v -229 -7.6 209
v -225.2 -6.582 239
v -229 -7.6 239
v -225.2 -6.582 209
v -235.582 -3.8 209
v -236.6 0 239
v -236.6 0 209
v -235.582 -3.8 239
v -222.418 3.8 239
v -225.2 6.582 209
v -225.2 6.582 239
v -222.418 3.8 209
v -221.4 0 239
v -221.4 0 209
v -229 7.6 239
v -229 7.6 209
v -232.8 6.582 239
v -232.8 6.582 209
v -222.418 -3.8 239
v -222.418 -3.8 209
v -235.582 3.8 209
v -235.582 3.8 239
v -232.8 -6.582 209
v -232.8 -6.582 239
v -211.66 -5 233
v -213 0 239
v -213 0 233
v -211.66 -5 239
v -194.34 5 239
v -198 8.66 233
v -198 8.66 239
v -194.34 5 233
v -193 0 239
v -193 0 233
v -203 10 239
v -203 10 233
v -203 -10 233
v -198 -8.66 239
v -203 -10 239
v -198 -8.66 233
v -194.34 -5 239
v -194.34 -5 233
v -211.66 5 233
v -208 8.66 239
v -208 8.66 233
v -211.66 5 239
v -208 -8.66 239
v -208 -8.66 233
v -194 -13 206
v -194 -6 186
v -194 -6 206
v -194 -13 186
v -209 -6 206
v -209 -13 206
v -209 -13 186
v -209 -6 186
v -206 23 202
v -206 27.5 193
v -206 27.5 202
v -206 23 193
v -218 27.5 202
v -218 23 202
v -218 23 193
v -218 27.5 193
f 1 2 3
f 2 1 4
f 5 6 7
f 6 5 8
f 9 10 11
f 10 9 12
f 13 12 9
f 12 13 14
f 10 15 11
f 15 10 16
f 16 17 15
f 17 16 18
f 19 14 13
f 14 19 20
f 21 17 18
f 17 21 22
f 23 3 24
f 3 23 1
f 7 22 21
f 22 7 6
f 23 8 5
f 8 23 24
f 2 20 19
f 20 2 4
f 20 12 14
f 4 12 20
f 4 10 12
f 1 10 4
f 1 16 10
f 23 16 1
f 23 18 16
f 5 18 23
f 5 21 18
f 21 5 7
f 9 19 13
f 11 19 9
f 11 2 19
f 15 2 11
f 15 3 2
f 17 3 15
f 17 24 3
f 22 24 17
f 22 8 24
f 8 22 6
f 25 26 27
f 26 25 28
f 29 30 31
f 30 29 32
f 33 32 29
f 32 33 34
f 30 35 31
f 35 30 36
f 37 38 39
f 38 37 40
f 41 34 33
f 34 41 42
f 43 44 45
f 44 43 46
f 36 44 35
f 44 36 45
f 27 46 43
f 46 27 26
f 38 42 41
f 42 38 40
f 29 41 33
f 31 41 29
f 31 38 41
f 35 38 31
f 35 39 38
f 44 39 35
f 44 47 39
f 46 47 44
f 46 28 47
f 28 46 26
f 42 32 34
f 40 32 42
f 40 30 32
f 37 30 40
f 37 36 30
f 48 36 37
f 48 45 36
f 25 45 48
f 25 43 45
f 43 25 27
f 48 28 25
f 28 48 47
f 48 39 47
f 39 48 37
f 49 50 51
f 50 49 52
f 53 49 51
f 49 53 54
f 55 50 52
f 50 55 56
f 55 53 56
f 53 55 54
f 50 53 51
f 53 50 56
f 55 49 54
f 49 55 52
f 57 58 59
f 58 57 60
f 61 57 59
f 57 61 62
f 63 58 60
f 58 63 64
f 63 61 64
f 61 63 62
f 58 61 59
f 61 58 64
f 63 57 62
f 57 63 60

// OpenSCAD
// file: ../Parts/rounder.scad
// rounder.scad
// cutting tool for rounding off corners with a cylinder

//---------------------
module rounder(
r=10,   // radius
h=10,   // height
f=22,    // $fn
extra=0.01  // extra size for the cube
){

difference(){
  translate([-extra,-extra,-extra])
  cube([r+extra,r+extra,h+2*extra]);
  translate([r,r,-1])
  cylinder(r=r,h=h+2,$fn=f);
}

}

//========================

rounder();

//========================
// file: ../Parts/acin.scad
// acin.scad
// Delta AC input, with switch, fuse, and EMI line filter
// 115V/6A, 250V/4A, PN 06AR2D

use <tslot.scad>
use <rounder.scad>

//---------------------------------------------------------
module acin(tol=0,cut=0){
translate([-tol/2,-tol/2,-tol/2])


difference(){
  union(){
    // body
    cube([44+tol,26.8+tol,65+tol]);
    // front plate
    translate([ 44, -(29-26.8)/2, -(67.35-65)/2 ])
    cube([3+tol,29+tol,67.35+tol]);
  }
  if(cut==0){
    translate([ 47-18, 6, 5 ])
    cube([18.7,16.5,24.5]);
  }
}
  
// switch
translate([ 42, 3, 48 ])
rotate([0,0,30])
cube([13,15,11]);

// ground tab
translate([ -12, 10, 63 ])
cube([12,6.3,1]);

// line tab
translate([ -12, 5.5, 49 ])
cube([12,1,6.3]);

// neutral tab
translate([ -12, 26-5.5, 49 ])
cube([12,1,6.3]);

}

//--------------------------------------
module acbox(){
  
  difference(){
    translate([-58,15.1,34])
    cube([53,33,50]);

    translate([-60,14,57])
    rotate([0,-23,0])
    cube([65,40,30]);

    translate([-60,14,78])
    cube([65,40,30]);

    translate([-55,18,36])
    acin(tol=0.15,cut=1);

    translate([-9,20,38])   // for support
    cube([5,24,34]);
    
    translate([-22,32,30])
    cylinder(r=9,h=10,$fn=22);

    translate([-44,32,30])
    cylinder(r=9,h=10,$fn=22);

    translate([-24,50,52])
    rotate([90,0,0])
    cylinder(r=10,h=10,$fn=22);

    translate([-45,50,49])
    rotate([90,0,0])
    cylinder(r=7,h=10,$fn=22);

    translate([-60,32,46])
    rotate([0,90,0])
    cylinder(r=6,h=10,$fn=22);

  }


    difference(){
      color("pink")
      translate([-58,11.0,50.2-2])
      cube([53,5,6]);

      color("gray")
      translate([-59,11.0,52-2.5])
      rotate([45,0,0])
      cube([55,7,6]);
    }
    
    color("cyan")
    difference(){
      hull(){
        translate([-58,11,44.5])
        cube([53,5,5]);
        translate([-33,0,44.5])
        scale([1.5,1,1])
        cylinder(r=13,h=5,$fn=88);
      }

      // back rail
      color("gray")
      translate([-200,0,15])
      rotate([90,0,90])
      tslot1(type=2,len=200,tol=0.15);
      
      // tslot mounts
      translate([-33,0,40])
      cylinder(r=5.9/2,h=20,$fn=22);

    }
}

//===============================
//acbox();

// support for the bar above the plug
if(1){
color("pink")
translate([-8,20,38])   // for support
cube([3,24,34]);

      hull(){
        translate([-58,11,34])
        cube([53,5,12]);
        translate([-33,0,34])
        scale([1.5,1,1])
        cylinder(r=13,h=12,$fn=88);
      }
}

if(0){
color("orange")
translate([-55,18,36])
acin();
}

if(0){
    // back rail
    color("gray")
    translate([-200,0,15])
    rotate([90,0,90])
    tslot1(type=2,len=200);

    // left rail
    color("green")
    translate([-30,15,0])
    rotate([0,90,90])
    tslot1(type=2,len=150);

    // left tower corner 1
    color("gray")
    translate([-15,60+25+15,15])
    rotate([90,0,-90])
    tbrace();
    
    // left tower corner 2
    color("gray")
    translate([-45,60+25+15,15])
    rotate([90,0,-90])
    tbrace();
}

//===============================
// file: zaxis.scad
// zaxis

use <../Parts/tslot.scad>
use <../Parts/motors.scad>
use <../Parts/switch.scad>
use <../Parts/rounder.scad>

// Center to motor screw
x1=-7; 

// Center to rod
x3=19;

// Label?
yoff3=6;

// sides2
F2=88;


//------------------------------
module zleft1(
x1=-10,
x3=15,
yoff3=6
){

F2=88;
F3=88;

z4=41;  // translate 38
z5=6;  // thick 10

difference(){
// boss
minkowski(){    
union(){
    // over motor
    color("gray")
    translate([-6,-2,z4])
    linear_extrude(height=z5,convexity=10)
    square([44,48],center=true);

    // back corner
    color("pink")
    translate([20,-13,z4])
    linear_extrude(height=z5,convexity=10)
    square([16,24],center=true);

    // rounded corner
    color("green")
    translate([16,-2,z4])
    scale([1,2,1])
    cylinder(r=12,h=z5,$fn=F2);

    // collar around rod
    color("red")
    translate([x3,0,z4+z5])
    cylinder(r=7,h=2,$fn=F2);

    difference(){
        // vertical tab
        color("orange")
        translate([0,-22,z4])
        linear_extrude(height=21,convexity=10)
        square([56,8],center=true);

        // corner cutout for extruder body
        translate([x1-19,-10,62])
        rotate([90,0,0])
        cylinder(r=8,h=30,$fn=F2);
    }

    // fillet
    color("blue")
    translate([0,-16.0,z4+3])
    rotate([45,0,0])
    linear_extrude(height=6,convexity=10)
    square([56,6],center=true);

    // collar around screw
    translate([x1,0,z4+z5])
    cylinder(r=7,h=2,$fn=F2);
}
sphere(r=2,$fs=0.2);
}


// left tower
translate([0,-30-42.3/2-yoff3,0])
tslot1(type=3,len=100,tol=0.15);

// left z motor
color("red")
translate([x1,0,0])
rotate([0,0,180])
zmotor(tol=0.15);

// left z rod, add some tolerance
color("red")
translate([x3,0,42])
cylinder(r=5+0.05,h=350,$fn=F2);
    
    // mounting holes,
    translate([15.5+x1,15.5,30])
    cylinder(r=1.6,h=30,$fn=F3);
    translate([-15.5+x1,15.5,30])
    cylinder(r=1.6,h=30,$fn=F3);
    translate([15.5+x1,-15.5,30])
    cylinder(r=1.6,h=20,$fn=F3);
    translate([-15.5+x1,-15.5,30])
    cylinder(r=1.6,h=20,$fn=F3);

    // countersink for the heads
    translate([15.5+x1,15.5,46])
    cylinder(r=2.8,h=4,$fn=F3);
    translate([-15.5+x1,15.5,46])
    cylinder(r=2.8,h=4,$fn=F3);
    translate([15.5+x1,-15.5,46])
    cylinder(r=2.8,h=30,$fn=F3);
    translate([-15.5+x1,-15.5,46])
    cylinder(r=2.8,h=30,$fn=F3);


    // extra clearance for leadscrew
    translate([x1,0,z4-5])
    cylinder(r=5,h=20,$fn=F2);

    // tslot mounts
    translate([15,-42.3/2-5-yoff3,56])
    rotate([-90,0,0])
    cylinder(r=5.9/2,h=20,$fn=F2);

    translate([15,-42.3/2+0.5-yoff3+5,56])
    rotate([-90,0,0])
    cylinder(r=5,h=6,$fn=F2);

    translate([-15,-42.3/2-5-yoff3,56])
    rotate([-90,0,0])
    cylinder(r=5.9/2,h=20,$fn=F2);

    translate([-15,-42.3/2+0.5-yoff3+5,56])
    rotate([-90,0,0])
    cylinder(r=5,h=6,$fn=F2);
}    
}

//----------------------------------------------------------------
module zleft2a(
x1=-8,
x3=17,
yoff3=6,
endstop=1
){

F2=88;
F3=22;

// boss
difference(){
translate([0,0,342])
union(){
    // over rods
    color("cyan")
    translate([6,-9.5,53])
    cube([44,37,20],center=true);

    // end stop switch block
    color("orange")
    translate([6,-9.5,34])
    cube([26,37,24],center=true);
    translate([23,-14,34])
    cube([10,28,24],center=true);

    // collar around rod
    color("red")
    translate([x3,0,22])
    cylinder(r=9,h=24,$fn=F2);

    // collar around screw
    translate([x1,0,22])
    cylinder(r=9,h=24,$fn=F2);


}
    // corner cuts
    color("pink")
    translate([28,9,38+342])
    rotate([0,0,180])
    rounder(r=9,h=30,f=88);

    // corner cuts
    color("pink")
    translate([-16,9,38+342])
    rotate([0,0,-90])
    rounder(r=9,h=30,f=88);
    
    // left tower, note extra clearance tol=0.25
    translate([0,-30-42.3/2-yoff3,0])
    tslot1(type=3,len=380,tol=0.25);

    // top rail, no extra clearance tol=0.15
    translate([-30,-30-42.3/2-yoff3,380+15])
    rotate([0,90,0])
    tslot1(type=2,len=60,tol=0.15);

    // left top L front
    color("pink")
    translate([0,-42.3/2-yoff3,380+30])
    rotate([-90,90,0])
    lbrace(tol=0.15);
    // trim off leftover that is in the Tslot
    color("red")
    translate([-25,-42.3/2-yoff3-4,386])
    cube([25,6,20]);

    // left z rod, add some tolerance
    color("red")
    translate([x3,0,42])
    cylinder(r=5+0.1,h=350.15,$fn=F2);
    
    // extra clearance for leadscrew
    translate([x1,0,360])
    cylinder(r=5,h=30,$fn=F3);

    // M5 mount to top rail
    translate([5,-42.3/2-yoff3-4,380+15])
    rotate([-90,0,0])
    cylinder(r=5.9/2,h=12,$fn=F2);

    translate([5,-42.3/2+0.5-yoff3+6.5,380+15])
    rotate([-90,0,0])
    cylinder(r=5,h=60,$fn=F2);
  
if(endstop==1){  
    // cut for the end stop switch
    Tol1=0.15;
    translate([9,-42.3/2-yoff3+1,381])
    rotate([-90,0,90])
    translate([-Tol1/2,-Tol1/2,-Tol1/2])
    switch(ang1=0,tol=Tol1);
  
    // cuts for the end stop switch
    // allow insertion
    translate([-8,-42.3/2-yoff3-3.5,352])
    cube([10.5,25,30]);
    translate([-8,-42.3/2-yoff3+19,350])
    cube([10,6,20]);
    
    // cut for lever arm near fulcrum
    translate([2,-42.3/2-yoff3+3,352])
    cube([7,17,20]);
    // cut for lever arm near roller
    translate([-0.5,-42.3/2-yoff3+10,352])
    cube([11,15,18]);
    // cut for NC
    translate([-6,-42.3/2-yoff3+17,380])
    cube([16,3.5,7]);
    // cut for NO
    translate([-6,-42.3/2-yoff3+10,380])
    cube([16,3.5,7]);
    // cut for C
    translate([-6,-42.3/2-yoff3+1,380])
    cube([16,3.5,7]);
    // trim down the posts
    translate([2.4,-42.3/2-yoff3+4,374])
    cube([4,14,6]);

}  // end of if(endstop)

  // add a tunnel for the endstop wires
  translate([-12,yoff3-23,380])
  cylinder(r=1.8,h=33,$fn=22);
  translate([-12,yoff3-23,404])
  cylinder(r1=1.8,r2=2.8,h=1,$fn=22);
  translate([-12,yoff3-23,385])
  cylinder(r1=2.8,r2=1.8,h=1,$fn=22);
  
} // end of difference

// add a loop for the wires **************
difference(){
  hull(){
  translate([-9,yoff3-23,380])
  rotate([0,90,0])
  cylinder(r=3,h=3,$fn=22);
  translate([-9,yoff3-23,390])
  rotate([0,90,0])
  cylinder(r=3,h=3,$fn=22);
  }
  translate([-10,yoff3-23,380])
  rotate([0,90,0])
  cylinder(r=1.8,h=5,$fn=22);
}

// show where switch will fit, both angles for the lever arm
if(0){
  translate([9,-42.3/2-yoff3+1,381])
  rotate([-90,0,90]){
    color("green")
    switch(ang1=10);
    color("red")
    switch(ang1=0);
    }
}    
    
}

//---------------------------------
module zleft2(
x1=-8,
x3=17,
yoff3=6
){

F2=88;
F3=22;
    
    zleft2a(x1=x1,x3=x3,yoff3=yoff3);

    
}
//---------------------------------
module zright2(
x1=-8,
x3=17,
yoff3=6
){

F2=88;
F3=22;
    
    mirror([1,0,0])
    zleft2a(x1=x1,x3=x3,yoff3=yoff3);
    
}


//===============================


//mirror([1,0,0])
//zleft1(x1=x1,x3=x3,yoff3=yoff3);

//translate([70,0,0])
//zleft2(x1=x1,x3=x3,yoff3=yoff3);

zright2(x1=x1,x3=x3,yoff3=yoff3);

if(0){
// left tower
color("gray")
translate([0,-30-42.3/2-yoff3,0])
tslot1(type=3,len=380,tol=0.15);

// top rail
color("gray")
translate([-30,-30-42.3/2-yoff3,380+15])
rotate([0,90,0])
tslot1(type=2,len=60,tol=0.15);

// left top L front
color("pink")
translate([0,-42.3/2-yoff3,380+30])
rotate([-90,90,0])
lbrace();

/*
// left z motor
color("red")
translate([x1,0,0])
rotate([0,0,180])
zmotor(tol=0.15);
*/

// left z rod, add some tolerance
color("red")
translate([x3,0,42])
cylinder(r=5+0.1,h=350,$fn=F2);
}

//================================
// file: frame.scad
// frame
// frame for the PrusaDusa

use <../Parts/tslot.scad>
use <../Parts/acin.scad>



//-----------------------------------------------------------------
// Customizer Values:
// These must be at the top of the main file, cannot contain any
// computations, and should have a comment above to provide text

// Tower offset from center 
yoff=-50; 

// Length front, back, top rail 
x1=480;         

// Length side rails
y1=330;      

// Length of towers
z1=380;       

//--------------------------------------
module frame(
yoff=-62,       // tower and top offset from center
x1=480,         // length front, back, top rails
y1=330,         // length side rails
z1=380          // height of towers
){
    
x2=x1/2;    // 240
y2=y1/2;    // 165
    //---------- rails ----------------
    
    // front rail
    translate([-x2,y2+15,15])
    rotate([90,0,90])
    tslot1(type=2,len=x1);

    // back rail
    translate([-x2,-y2-15,15])
    rotate([90,0,90])
    tslot1(type=2,len=x1);

    // left rail
    translate([x2-30,-y2,0])
    rotate([0,90,90])
    tslot1(type=2,len=y1);

    // right rail
    translate([-x2+30,-y2,0])
    rotate([0,90,90])
    tslot1(type=2,len=y1);

    // left tower
    translate([x2-30,yoff,15])
    rotate([0,0,0])
    tslot1(type=3,len=z1);

    // right tower
    translate([-x2+30,yoff,15])
    rotate([0,0,0])
    tslot1(type=3,len=z1);

    // top rail
    translate([-x2,yoff,15+z1+15])
    rotate([0,90,0])
    tslot1(type=2,len=x1);
    
    //--------- triangle corners in base ------------
    
    // right front corner
    color("green")
    translate([-x2+60,y2,0])
    rotate([0,0,-90])
    tbrace();
    
    // left front corner
    color("red")
    translate([x2-60,y2,0])
    rotate([0,0,-180])
    tbrace();
    
    // right rear corner
    color("gray")
    translate([-x2+60,-y2,0])
    rotate([0,0,0])
    tbrace();
    
    // left rear corner
    color("gray")
    translate([x2-60,-y2,0])
    rotate([0,0,-270])
    tbrace();

    //--------- triangle corners top beam ----------  

    // Removed two triangle corners for extruder clearance
    
/*
    // left top corner 1
    color("gray")
    translate([x2-60,yoff+15,z1+15])
    rotate([90,180,0])
    tbrace();
    
    // left top corner 2
    color("gray")
    translate([x2-60,yoff-15,z1+15])
    rotate([90,180,0])
    tbrace();

    
    // right top corner 1
    color("gray")
    translate([-x2+60,yoff+15,z1+15])
    rotate([90,90,0])
    tbrace();
    
    // right top corner 2
    color("gray")
    translate([-x2+60,yoff-15,z1+15])
    rotate([90,90,0])
    tbrace();
*/
    
   //------------- triangle corners back of towers -------------
   
    // left tower corner 1
    color("gray")
    translate([x2-45,yoff-30,15])
    rotate([90,0,-90])
    tbrace();
    
    // left tower corner 2
    color("gray")
    translate([x2-15,yoff-30,15])
    rotate([90,0,-90])
    tbrace();
    
    // right tower corner 1
    color("gray")
    translate([-x2+45,yoff-30,15])
    rotate([90,0,-90])
    tbrace();

    // right tower corner 2
    color("gray")
    translate([-x2+15,yoff-30,15])
    rotate([90,0,-90])
    tbrace();
    
    // ----------- L braces in the base ----------------
/*
    // left front L top
    color("gray")
    translate([x2,y2+30,15])
    rotate([0,0,-180])
    lbrace();
    
    // right front L top
    color("gray")
    translate([-x2,y2+30,15])
    rotate([0,0,-90])
    lbrace();

    // left rear L top
    color("gray")
    translate([x2,-y2-30,15])
    rotate([0,0,90])
    lbrace();
    
    // right rear L top
    color("gray")
    translate([-x2,-y2-30,15])
    rotate([0,0,0])
    lbrace();
    
*/    
    // left front L bottom
    color("gray")
    translate([-x2,y2+30,-15])
    rotate([180,0,0])
    lbrace();
    
    // left front L bottom
    color("gray")
    translate([x2,y2+30,-15])
    rotate([180,0,-90])
    lbrace();
    
    // left rear L bottom
    color("gray")
    translate([-x2,-y2-30,-15])
    rotate([180,0,90])
    lbrace();
    
    // left rear L bottom
    color("gray")
    translate([x2,-y2-30,-15])
    rotate([180,0,-180])
    lbrace();
    
    // ------------ L braces top rail --------------
    // left top L front
    color("gray")
    translate([x2-30,yoff+30,z1+45])
    rotate([-90,90,0])
    lbrace();
    
    // left top L rear
    color("gray")
    translate([x2-30,yoff-30,z1+45])
    rotate([90,180,0])
    lbrace();
    
    // right top L front
    color("gray")
    translate([-x2+30,yoff+30,z1+45])
    rotate([-90,0,0])
    lbrace();
    
    
    // right top L rear
    color("gray")
    translate([-x2+30,yoff-30,z1+45])
    rotate([90,90,0])
    lbrace();
    
    //------------ shelf -----------------
    
    // left side rail
    translate([x2-15,yoff-30,15+z1+15])
    rotate([0,90,-90])
    tslot1(type=1,len=120);
    
    // left side rail
    translate([-x2+15,yoff-30,15+z1+15])
    rotate([0,90,-90])
    tslot1(type=1,len=120);
    
    // back rail
    translate([-x2,yoff-165,15+z1+15])
    rotate([0,90,0])
    tslot1(type=1,len=x1);

    //---------- triangle corners shelf ---------------

    // left shelf corner
    color("red")
    translate([x2-15,yoff-30,z1+15])
    rotate([-90,0,-90])
    tbrace();

    // right shelf corner
    color("green")
    translate([-x2+15,yoff-30,z1+15])
    rotate([-90,0,-90])
    tbrace();
    
    //---------- L braces shelf ------------------

    // tower to shelf left
    color("gray")
    translate([x2,yoff,z1+45])
    rotate([-90,0,-90])
    lbrace();
    
    // tower to shelf right
    color("gray")
    translate([-x2,yoff,z1+45])
    rotate([90,90,-90])
    lbrace();
    
    // left side rail to back rail
    color("gray")
    translate([x2,yoff-180,z1+15])
    rotate([0,180,0])
    lbrace();
    
    // right side rail to back rail
    color("gray")
    translate([-x2,yoff-180,z1+15])
    rotate([0,180,-90])
    lbrace();
    
    // power supply
    color("silver")
    translate([x2-45,yoff-30,90])
    rotate([0,0,180])
    ps();
    
    // ac box
    translate([x2,-y2-15,0]){
    color("green")
    acbox();
    color("gray")
    translate([-55,20,36])
    acin();
    }
}
//------------------------------------
module ps(){
  
translate([-45,0,0]){
  // body
  cube([90,45,225]);
  // tabs
  translate([15/2,0,225])
  cube([75,1,14]);
  translate([15/2,0,-14])
  cube([75,1,14]);
}
// power cords
translate([-25,45/2,225])
cylinder(r=4.5,h=12,$fn=22);
translate([0,45/2,-12])
cylinder(r=4.5,h=12,$fn=22);
  
} 

 
//====================================

frame(yoff=yoff,x1=x1,y1=y1,z1=z1);
//cylinder(r=10,h=180);

//ps();
 
//=====================================
// file: ../Parts/switch.scad
// switch.scad
// micro switch 



//--------------
module switch(
tol=0,  // include for cutting
ang1=5,  // angle of the lever arm
wirecut=0   // set to 1 for clearance around terminals
){

difference(){
  // switch body
  cube([20+tol,9.9+tol,6.5+tol]);  

  // mounting hole NO
  translate([5.0,2.8,-1])
  cylinder(r=2.3/2-tol,h=10,$fn=22);

  // mounting hole NC
  translate([14.75,2.8,-1])
  cylinder(r=2.3/2-tol,h=10,$fn=22);
}

// lump on top body
translate([0,9.9,0])
cube([9.9+tol,0.7+tol,6.5+tol]);  
  
// common leg
translate([1.5,-4.1,1.5])
cube([0.5+tol,4.1+tol,3.2+tol]);

// normally open leg
translate([10.3,-4.1,1.5])
cube([0.5+tol,4.1+tol,3.2+tol]);

// normally closed leg
translate([17.7,-4.1,1.5])
cube([0.5+tol,4.1+tol,3.2+tol]);

// lever fulcrum
translate([2.8,10.4,1.25])
cube([1.5+tol,1.5+tol,4.0+tol]);

// -------- these parts move:

// lever arm
translate([2.8,11.6,1.25])
rotate([0,0,ang1]){
  
  // arm
  cube([19.2+tol,0.35+tol,4.0+tol]);
  
  // roller
  translate([17.5,3.0,0])
  cylinder(r=4.5/2+tol,h=4+tol,$fn=22);
  
  // roller support
  translate([17.5,3.0,-1.5])
  cylinder(r=3.7/2+tol,h=6.9+tol,$fn=22);
  color("cyan")
  translate([17.5-1.75,0,-1.5])
  cube([3.7+tol,3+tol,1.5+tol]);
  color("cyan")
  translate([17.5-1.75,0,-1.5+5.4])
  cube([3.7+tol,3+tol,1.5+tol]);
  
}

}  // end of module switch
//------------------------------------------
module switchcut(tol=0.15){
  
difference(){
  // switch body
  translate([-tol/2,-tol/2,-tol/2])
  cube([20+tol,9.9+tol,13+tol]);  

  // mounting hole NO
  translate([5.0,2.8,-1])
  cylinder(r=2.3/2-tol/2,h=4,$fn=22);

  // mounting hole NC
  translate([14.75,2.8,-1])
  cylinder(r=2.3/2-tol/2,h=4,$fn=22);
}

translate([-tol/2,-tol/2,-tol/2]){

// lump on top body
translate([0,9.9,0])
cube([9.9+tol,0.7+tol,13+tol]);  
  
// common leg
translate([0.5,-4.3,1])
cube([3,4.5,12]);

// normally open leg
translate([9.3,-4.3,1])
cube([3,4.5,12]);

// normally closed leg
translate([16.7,-4.3,1])
cube([3,4.5,12]);

// arm
translate([1.5,8,0])
cube([16.5,13,13]);

// roller
translate([16,11,-1])
cube([7.5,10,15]);

// insertion cut
translate([0,0,6.4])
cube([20+tol,16,6.5]);  
}

}
  
//==========================================

//translate([0,0,6.5])
color("red") 
switch(ang1=0);
color("green") 
switch(ang1=12);

difference(){
  translate([-5,-5,-5])  
  cube([30,20,16]);
  switchcut(tol=0.15);
}

if(0){
Tol1=0.2;
translate([0,25,0])
difference(){
  translate([-Tol1/2,-Tol1/2,-Tol1/2])  
  switch(ang1=0,tol=Tol1);
  switch(ang1=0);
}
}

//==================
// file: ../Parts/motors.scad
// motors

//-------------------------------------
module zmotor(tol=0){
F2=88;
F3=22;
    
    difference(){
    // boss
    translate([0,0,39/2])
    intersection(){
        cube([42.4+tol,42.4+tol,39+tol],center=true);
        cylinder(r=25+tol,h=40,center=true,$fn=F2);
    }
    // mounting holes
    translate([15.5,15.5,35])
    cylinder(r=1.5,h=10,$fn=F3);
    translate([-15.5,15.5,35])
    cylinder(r=1.5,h=10,$fn=F3);
    translate([15.5,-15.5,35])
    cylinder(r=1.5,h=10,$fn=F3);
    translate([-15.5,-15.5,35])
    cylinder(r=1.5,h=10,$fn=F3);
    
    }
    
    // top cylinder
    translate([0,0,39])
    cylinder(r=11+tol,h=1.85+tol,$fn=F2);
    
    // wiring box
    translate([42.4/2,-16.5/2,0])
    cube([6.3+tol,16.5+tol,10+tol]);
    
    // lead screw
    translate([0,0,39])
    cylinder(r=4+tol,h=350+tol,$fn=F3);
    
}
//-------------------------------------
module xymotor(tol=0){
F2=88;
F3=22;
    z1=47.3;
    
    difference(){
    // boss
    translate([0,0,z1/2])
    intersection(){
        cube([42.4,42.4,z1],center=true);
        cylinder(r=53/2,h=z1,center=true,$fn=F2);
    }

    // stator stack smaller than end plates
    translate([0,0,z1/2]){
        difference(){
            cube([60,60,30.2],center=true);
            cylinder(r=50.2/2,h=30.2,center=true,$fn=F2);
        }
    }
    
    // mounting holes
    translate([15.5,15.5,z1-5])
    cylinder(r=1.5,h=10,$fn=F3);
    translate([-15.5,15.5,z1-5])
    cylinder(r=1.5,h=10,$fn=F3);
    translate([15.5,-15.5,z1-5])
    cylinder(r=1.5,h=10,$fn=F3);
    translate([-15.5,-15.5,z1-5])
    cylinder(r=1.5,h=10,$fn=F3);
    
    }
    
    // top cylinder
    translate([0,0,z1])
    cylinder(r=11,h=1.85,$fn=F2);
    
    // wiring box
    translate([42.4/2,0,2.0+2.5])
    rotate([0,90,0])
    cylinder(r=2.5,h=10);
    
    // main shaft
    translate([0,0,z1])
    cylinder(r=2.5,h=20,$fn=F3);
    
}
//-------------------------------------
module emotor(tol=0){
F2=88;
F3=22;
    z1=39.0;
    
    difference(){
    // boss
    translate([0,0,z1/2])
    intersection(){
        cube([42.4,42.4,z1],center=true);
        cylinder(r=53/2,h=z1,center=true,$fn=F2);
    }

    // stator stack smaller than end plates
    translate([0,0,z1/2]){
        difference(){
            cube([60,60,14.2],center=true);
            cylinder(r=50/2,h=30.2,center=true,$fn=F2);
        }
    }
    
    // mounting holes
    translate([15.5,15.5,z1-5])
    cylinder(r=1.5,h=10,$fn=F3);
    translate([-15.5,15.5,z1-5])
    cylinder(r=1.5,h=10,$fn=F3);
    translate([15.5,-15.5,z1-5])
    cylinder(r=1.5,h=10,$fn=F3);
    translate([-15.5,-15.5,z1-5])
    cylinder(r=1.5,h=10,$fn=F3);
    
    }
    
    // top cylinder
    translate([0,0,z1])
    cylinder(r=11,h=1.85,$fn=F2);
    
    // wiring box
    translate([42.4/2,-8.25,0])
    cube([8+tol,16.5+tol,11+tol]);
    
    // main shaft
    translate([0,0,z1])
    cylinder(r=2.5,h=28,$fn=F3);
    
}
//-----------------------------------
module znut(holes=1,tol=0){
    F2=88;
    
    cylinder(r=9.95/2+tol,h=10.45+tol,$fn=F2);
    
    difference(){
        translate([0,0,2])
        cylinder(r=21.9/2+tol,h=3.55,$fn=F2);

        if(holes==1){
            translate([7.75,0,0])
            cylinder(r=1.5,h=6,$fn=F2);
            translate([0,7.75,0])
            cylinder(r=1.5,h=6,$fn=F2);
            translate([-7.75,0,0])
            cylinder(r=1.5,h=6,$fn=F2);
            translate([0,-7.75,0])
            cylinder(r=1.5,h=6,$fn=F2);
        }
    }

}
//------------------------------
module pulley(tol=0){
    F2=88;

    difference(){
    union(){
        cylinder(r=13/2,h=6,$fn=F2);
        
        translate([0,0,6])
        cylinder(r=9.6/2,h=7,$fn=F2);
        
        translate([0,0,13])
        cylinder(r=13/2,h=1,$fn=F2);
    }
    
    translate([0,0,-1])
    cylinder(r=2.5,h=17,$fn=F2);
        
    // grub screws
    translate([0,0,3.25])
    rotate([0,90,0])
    cylinder(r=1.2,h=17,$fn=F2);

    translate([0,0,3.25])
    rotate([-90,90,0])
    cylinder(r=1.2,h=17,$fn=F2);
    
}
    
}

//------------------------------
module idler(tol=0){
    F2=88;

    difference(){
    union(){
        cylinder(r=17.85/2,h=1,$fn=F2);
        
        translate([0,0,1])
        cylinder(r=14/2,h=7,$fn=F2);
        
        translate([0,0,8])
        cylinder(r=17.85/2,h=1,$fn=F2);
    }
    
    translate([0,0,-1])
    cylinder(r=1.5,h=17,$fn=F2);
        
}
    
}

//======================================

//translate([20,0,0])
//pulley();

//idler();

//zmotor();

//znut();
//emotor();
xymotor();

//========================================
// file: ../Parts/tslot.scad
// tslot
// models for tslots used in PrusaDusa

//---------------------------------------
module tslot1(
tol = 0.0,
len = 60,
type = 1
){
    
// 30x30     
if(type==1){
    linear_extrude(height=len,convexity=10)
    difference(){
        offset(r=2.0+tol,$fn=20)
        square([26,26],center=true);
 
        translate([0,12,0])
        square([8.2-tol,8.2-tol],center=true);
        translate([0,-12,0])
        square([8.2-tol,8.2-tol],center=true);
        translate([12,0,0])
        square([8.2-tol,8.2-tol],center=true);
        translate([-12,0,0])
        square([8.2-tol,8.2-tol],center=true);
    }
}
    
// 30x60
if(type==2){
    linear_extrude(height=len,convexity=10)
    difference(){
        offset(r=2.0+tol,$fn=20)
        square([26,56],center=true);
 
        translate([0,27,0])
        square([8.2-tol,8.2-tol],center=true);
        translate([0,-27,0])
        square([8.2-tol,8.2-tol],center=true);
        
        translate([12,15,0])
        square([8.2-tol,8.2-tol],center=true);
        translate([-12,15,0])
        square([8.2-tol,8.2-tol],center=true);

        translate([12,-15,0])
        square([8.2-tol,8.2-tol],center=true);
        translate([-12,-15,0])
        square([8.2-tol,8.2-tol],center=true);
    }
}
    
// 36x60
if(type==3){
    linear_extrude(height=len,convexity=10)
    difference(){
        offset(r=2.0+tol,$fn=20)
        square([56,56],center=true);
 
        translate([15,27,0])
        square([8.2-tol,8.2-tol],center=true);
        translate([15,-27,0])
        square([8.2-tol,8.2-tol],center=true);
        
        translate([-15,27,0])
        square([8.2-tol,8.2-tol],center=true);
        translate([-15,-27,0])
        square([8.2-tol,8.2-tol],center=true);
        
        translate([27,15,0])
        square([8.2-tol,8.2-tol],center=true);
        translate([-27,15,0])
        square([8.2-tol,8.2-tol],center=true);

        translate([27,-15,0])
        square([8.2-tol,8.2-tol],center=true);
        translate([-27,-15,0])
        square([8.2-tol,8.2-tol],center=true);
    }
}
    
}

//--------------------------------------
module tbrace(
tol=0.0
){

F2=22;
 
translate([0,0,2-15])    
difference(){    
union(){
        cube([4.8,60,26]);
        cube([60,4.8,26]);
    
    hull(){
        translate([60-2.4,4.8,0])
        cylinder(r=2.4,h=26,$fn=F2);
        translate([4.8,60-2.4,0])
        cylinder(r=2.4,h=26,$fn=F2);
    }
}    

        translate([15,0,26/2])
        rotate([-90,0,0])
        cylinder(r1=3.5,r2=4.5,h=60,$fn=F2);
        translate([15+30,0,26/2])
        rotate([-90,0,0])
        cylinder(r1=3.5,r2=4.5,h=60,$fn=F2);

        translate([0,15,26/2])
        rotate([0,90,0])
        cylinder(r1=3.5,r2=4.5,h=60,$fn=F2);
        translate([0,15+30,26/2])
        rotate([0,90,0])
        cylinder(r1=3.5,r2=4.5,h=60,$fn=F2);

}
}

//----------------------------------------
module lbrace(
tol=0,
holes=0,
nuts=1
){

F2=22;
    
pts1=[ [5,0], [80,0], [85,5], [85,22], [80,28],
    [28,28], [28,80], [22,85], [5,85], [0,80], [0,5] ];
    
if(holes==1){
    difference(){
        linear_extrude(height=3.25+tol,convexity=10)
        offset(r=tol)
        polygon(points=pts1);
        
        translate([16+30,14,-1])
        cylinder(r=3.25,h=5,$fn=F2);
        translate([16+60,14,-1])
        cylinder(r=3.25,h=5,$fn=F2);

        translate([14,16+30,-1])
        cylinder(r=3.25,h=5,$fn=F2);
        translate([14,16+60,-1])
        cylinder(r=3.25,h=5,$fn=F2);
    }
}else{
        linear_extrude(height=3.25+tol,convexity=10)
        offset(r=tol)
        polygon(points=pts1);
}

if(nuts==1){
    
        translate([16+30,14,0])
        cylinder(r=5,h=6+3.25,$fn=F2);
        translate([16+60,14,0])
        cylinder(r=5,h=6+3.25,$fn=F2);

        translate([14,16+30,0])
        cylinder(r=5,h=6+3.25,$fn=F2);
        translate([14,16+60,0])
        cylinder(r=5,h=6+3.25,$fn=F2);
}

}


//=======================================

lbrace();

translate([50,50,0])
lbrace(tol=0.2);

//tbrace();

/*
color("cyan")
tslot1(len=70);

color("green")
translate([0,15,0])
tslot1(type=2);

color("red")
translate([15,15,0])
tslot1(type=3,len=50);

*/

//=======================================
// main file
// xends
// x motor attachments

use <../Parts/tslot.scad>
use <../Parts/motors.scad>
use <../Parts/switch.scad>
use <frame.scad>
use <zaxis.scad>

// repeat params from dusa1.scad

// Height of x rods, 62-304
High0=150;        

// Left extruder position, 150+
LeftX0=150; 

// Right extruder position, 82+
RightX0=82;

// Show frame
frameOn=1;

// Show top z brackets
tops=1;  

// Show ybed ------------------
ybed=1;    

// Length front, back, top rail
x1=480;         

// Length side rails
y1=330;      

// Length of towers -----------
z1=380;       

// Center to Tower 
ytower=-57.2; 

// Tower to Z-axis, >0
ybracket=6;            

// Center to z-axis
//ytoz=7.2;
ytoz=0;


// Height of z rods
zoff2=43;   

// Distance zrod to zscrew
xrodscrew=26;     

// Offset of zscrew
zscrew = -7;

// Height of bottom x motor
zmotor1=45;    

// Delta between x motors
zmotorD=19;    

// Offset x motors from center of towers
xmot0=-2;

//---------------------------------
// Computed values based on parameters
zmotor2=zmotor1+zmotorD;

x2=x1/2;
y2=y1/2;
F2=88;


//------------------------------------------------------
module xleft1(



){

  
difference(){
// boss
translate([x2-50,-13,High0+22])
minkowski(convexity=8) {
  difference(){
    translate([0,2,0])
    cube([50,40-2,65]);    
//    translate([-1,-1,-1])
//    #cube([29,22,55]);
    
    translate([-3,-15,-1])
    rotate([0,0,45])
    cube([20,20,70]);
    translate([54,-15,-1])
    rotate([0,0,45])
    cube([20,20,70]);
//    translate([25,-15,-1])
//    rotate([0,0,45])
//    #cube([20,20,55]);
  }
  cylinder(r=2,h=2,$fn=F2);
}

if(1){  // all the cuts
  
// cut for left z rod plus clearance
translate([x2-30+zscrew+xrodscrew,0,15+42])
cylinder(r=5.3,h=350,$fn=F2);

// cut for left lm10u bearing lower plus clearance 
translate([x2-30+zscrew+xrodscrew,0,High0+20])
cylinder(r=19.01/2,h=29,$fn=F2);

// cut for left lm10u bearing upper plus clearance
translate([x2-30+zscrew+xrodscrew,0,High0+60])
cylinder(r=19.01/2,h=29+1,$fn=F2);

// strain relief cut for M10 and bearings
// leave a little material on the buildplate to help curling
translate([x2-30+zscrew+xrodscrew+10,-11,High0+18])
rotate([0,0,45])
cube([1,15,70]);

// add a cut so M10 could be pushed out if needed
translate([x2-30+zscrew+xrodscrew+10,-13,High0+42])
rotate([0,0,45])
cube([4,14,24]);

// arch the top of push out cut to make it printable
translate([x2-30+zscrew+xrodscrew+10,-13,High0+42])
rotate([0,45,45])
cube([2.8,14,2.8]);

// cut left znut
color("red")
translate([x2-30+zscrew,0,High0+90-1])
rotate([180,0,0])
znut(holes=0,tol=0.15);

// clearance for left znut
color("red")
translate([x2-30+zscrew,0,High0+90-1])
rotate([180,0,0])
cylinder(r=11.1,h=4,$fn=F2);

// cut left znut top clearance
color("blue")
translate([x2-30+zscrew,0,High0+90-4])
cylinder(r1=11,r2=12,h=4,$fn=F2);

// cut for znut mounting screws M3x20
translate([x2-30+zscrew,0,High0+90-2])
rotate([180,0,0]){
  translate([7.75,0,0])
  cylinder(r=1.5,h=20,$fn=F2);
  translate([-7.75,0,0])
  cylinder(r=1.5,h=20,$fn=F2);
}

// cuts for access to znut screws
translate([x2-30+zscrew,0,High0+11]){
  translate([7.75,0,0])
  cylinder(r=5.7/2,h=57,$fn=F2);
  translate([-7.75,0,0])
  cylinder(r=5.7/2,h=57,$fn=F2);
}

// cut left z screw
translate([x2-30+zscrew,0,15])
rotate([0,0,180])
zmotor(tol=0.15);

// extra clearance left z screw
translate([x2-30+zscrew,0,15])
rotate([0,0,180])
cylinder(r=4.5,h=350,$fn=F2);

// cut for upper x rod plus clearance
translate([-480/2,0+16,High0+zmotor1+34])
rotate([0,90,0])
cylinder(r=4+0.1,h=480,$fn=F2);

// upper x rod strain relief
translate([-480/2,0+16,High0+zmotor1+37])
rotate([0,90,0])
cylinder(r=2,h=480,$fn=9);

// check hole for upper x rod
translate([480/2-2.25,33,High0+zmotor1+34])
rotate([90,30,0])
cylinder(r=3,h=15,$fn=6);

// cut for lower x rod plus clearance
translate([-480/2,0+16,High0+30])
rotate([0,90,0])
cylinder(r=4+0.1,h=480,$fn=F2);

// lower x rod strain relief
translate([-480/2,0+16,High0+27])
rotate([0,90,0])
cylinder(r=2,h=480,$fn=9);

// check hole for lower x rod
translate([480/2-2.25,33,High0+30])
rotate([90,30,0])
cylinder(r=3,h=15,$fn=6);

// cut for left x motor
translate([480/2-30-xmot0,0+76,High0+zmotor1])
rotate([90,90,0])
xymotor(tol=0.15);

// cut for left x motor shaft
translate([480/2-30-xmot0,20,High0+zmotor1])
rotate([90,90,0])
cylinder(r=3,h=20,$fn=F2);

F3=22;

translate([-480/2-30-xmot0,65,High0+zmotor1])
rotate([90,0,0]){
    // x motor mounting holes,
    translate([15.5+x1,15.5,30])
    cylinder(r=1.6,h=30,$fn=F3);
    translate([-15.5+x1,15.5,30])
    cylinder(r=1.6,h=30,$fn=F3);
    translate([15.5+x1,-15.5,30])
    cylinder(r=1.6,h=30,$fn=F3);
    translate([-15.5+x1,-15.5,30])
    cylinder(r=1.6,h=30,$fn=F3);

    // countersink for the heads
    translate([15.5+x1,15.5,41])
    cylinder(r=3,h=40,$fn=F3);
    translate([-15.5+x1,15.5,41])
    cylinder(r=3,h=40,$fn=F3);
    translate([15.5+x1,-15.5,41])
    cylinder(r=3,h=40,$fn=F3);
    translate([-15.5+x1,-15.5,41])
    cylinder(r=3,h=40,$fn=F3);
}

// main cut for belt, pulley, and idler
color("cyan")
translate([480/2-80,0+9.5,High0+37])
cube([90,9.5,37]);

// arch the belt cut to make it printable 
color("cyan")
translate([480/2-80,14.25,High0+39])
rotate([0,90,0])
scale([0.9,1,1])
cylinder(r=9.5/2,h=90,$fn=F2);

// clearance for pulley
translate([480/2-30-xmot0,9.5,High0+zmotor1])
rotate([-90,90,0])
cylinder(r=8,h=20,$fn=F2);

// idler attachment M3x20 screw
translate([480/2-30-xmot0,26,High0+zmotor2-1.5])
rotate([90,90,0])
cylinder(r=1.55,h=20,$fn=F2);

// idler attachment M3x30 head and access
translate([480/2-30-xmot0,6,High0+zmotor2-1.5])
rotate([90,90,0])
cylinder(r=3,h=30,$fn=F2);

// idler attachment M3x30 nut
translate([480/2-36-xmot0,23,High0+zmotor2-7])
cube([12,6,9]);

// cut for the limit switch 
translate([x2-28+zscrew,-5,High0+90-48])
rotate([0,-90,90])
//mirror([0,0,0])
switchcut();
translate([x2-28+zscrew,-15,High0+90-48])
rotate([0,-90,90])
mirror([0,0,0])
switchcut();

// cut for BLtouch clearance 
translate([x2+zscrew-48.25,-14,High0+20])
cube([9,20,48]);

// brass M3 heat-set mounting for ooze prevention arm ***********************************
translate([x2+zscrew-33,-8,High0+25.5]){
  translate([0,0,-3.5])
  cylinder(r=2.3,h=3.5,$fn=22);
  cylinder(r=1.65,h=3.5+5,center=true,$fn=22);
}
translate([x2+zscrew-33,8,High0+25.5]){
  translate([0,0,-3.5])
  cylinder(r=2.3,h=3.5,$fn=22);
  cylinder(r=1.65,h=3.5+5,center=true,$fn=22);
}
translate([x2+zscrew-18,-6,High0+25.5]){
  translate([0,0,-3.5])
  cylinder(r=2.3,h=3.5,$fn=22);
  cylinder(r=1.65,h=3.5+5,center=true,$fn=22);
}

// x motor holes, 45 deg cuts to make printable
translate([-480/2-33-xmot0,-15,High0+zmotor1])
rotate([-90,0,0]){
    translate([-15.5+x1,15.5,0])
    cylinder(r=7.5,h=21,$fn=4);
    translate([-15.5+x1,-15.5,0])
    cylinder(r=7.5,h=21,$fn=4);
}

// cut for left x motor wires
translate([480/2-xmot0-6,30,High0+zmotor1+7])
scale([1,1,2])
rotate([90,0,15])
cylinder(r=2.5,h=45,$fn=F2);

// cut for limit switch wires 
translate([x2+zscrew-28,-14.8,High0+43])
cube([4.5,9,18]);
translate([x2+zscrew-24,-10.5,High0+54])
scale([1,1,2])
rotate([0,90,0])
cylinder(r=1,h=30,$fn=20);

// pry out for limit switch
translate([x2+zscrew-44,-5.5,High0+50])
cube([8,2,4]);

// cut for visibility
//translate([x2-30+zscrew-50,-40,High0+20])
//cube([100,40,100]);


} // end if all cuts

}// end diff
  
// text labels
color("red")
translate([x2-28,28,High0+81])
rotate([90,0,180])
linear_extrude(height=2,scale=1)
text("PRUSA", font = "Open Sans:style=Bold", size=7,halign="center",valign="center",spacing=1.1);
color("red")
translate([x2-28,28,High0+72])
rotate([90,0,180])
linear_extrude(height=2,scale=1)
text("DUSA", font = "Open Sans:style=Bold", size=7,halign="center",valign="center",spacing=1.1);

}

//-------------------------------------------------------------------------------------------------------
module xright1(

){
  
difference(){
// boss
translate([-x2,-13,High0+22])
minkowski(convexity=8) {
  difference(){
    translate([0,2,0])
    cube([50,40-2,65]);
    translate([-3+56,-15,-1])
    rotate([0,0,45])
    cube([20,20,70]);
    translate([-4,-15,-1])
    rotate([0,0,45])
    cube([20,20,70]);
  }
  cylinder(r=2,h=2,$fn=F2);
}

if(1){   // all the cuts
  
// cut for right z rod plus clearance
translate([-(x2-30+zscrew+xrodscrew),0,15+42])
cylinder(r=5.2,h=350,$fn=F2);

// cut for right lm10u bearing lower plus clearance
translate([-(x2-30+zscrew+xrodscrew),0,High0+20])
cylinder(r=19.01/2,h=29,$fn=F2);

// cut for right lm10u bearing upper plus clearance
translate([-(x2-30+zscrew+xrodscrew),0,High0+60])
cylinder(r=19.01/2,h=29+1,$fn=F2);

// strain relief cut for M10 and bearings
translate([-(x2-30+zscrew+xrodscrew-0.5)-12,-10,High0+16])
rotate([0,0,-45])
cube([1,15,71]);

// add a cut so M10 could be pushed back out if needed
translate([-(x2-30+zscrew+xrodscrew+14),-10.5,High0+42])
rotate([0,0,-45])
cube([4,14,24]);

// arch the top to make printable
translate([-(x2-30+zscrew+xrodscrew+14),-10.5,High0+42])
rotate([0,45,-45])
cube([2.8,14,2.8]);

// cut right znut
color("red")
translate([-(x2-30+zscrew),0,High0+90-1])
rotate([180,0,0])
znut(holes=0,tol=0.15);

// cut right znut top clearance
color("blue")
translate([-(x2-30+zscrew),0,High0+90-4])
cylinder(r1=11,r2=12,h=4,$fn=F2);

// cut for znut mounting screws M3x20
translate([-(x2-30+zscrew),0,High0+90-2])
rotate([180,0,0]){
  translate([7.75,0,0])
  cylinder(r=1.5,h=20,$fn=F2);
  translate([-7.75,0,0])
  cylinder(r=1.5,h=20,$fn=F2);
}

// cuts for access to znut screws
translate([-(x2-30+zscrew),0,High0+11]){
  translate([7.75,0,0])
  cylinder(r=5.7/2,h=57,$fn=F2);
  translate([-7.75,0,0])
  cylinder(r=5.7/2,h=57,$fn=F2);
}

// cut right z screw
translate([-(x2-30+zscrew),0,15])
rotate([0,0,180])
zmotor(tol=0.15);

// extra clearance right z screw
translate([-(x2-30+zscrew),0,15])
rotate([0,0,180])
cylinder(r=4.5,h=350,$fn=F2);

// cut for upper x rod plus clearance
translate([-480/2,0+16,High0+zmotor1+34])
rotate([0,90,0])
cylinder(r=4+0.1,h=480,$fn=F2);

// upper x rod strain relief
translate([-480/2,0+16,High0+zmotor1+37])
rotate([0,90,0])
cylinder(r=2,h=480,$fn=9);

// check hole for upper x rod
translate([-(480/2-2.25),33,High0+zmotor1+34])
rotate([90,30,0])
cylinder(r=3,h=15,$fn=6);

// cut for lower x rod plus clearance
translate([-480/2,0+16,High0+30])
rotate([0,90,0])
cylinder(r=4+0.05,h=480,$fn=F2);

// lower x rod strain relief
translate([-480/2,0+16,High0+27])
rotate([0,90,0])
cylinder(r=2,h=480,$fn=9);

// check hole for lower x rod
translate([-(480/2-2.25),33,High0+30])
rotate([90,30,0])
cylinder(r=3,h=15,$fn=6);

// cut for right x motor
translate([-(480/2-30-xmot0),0+76,High0+zmotor2])
rotate([90,90,0])
xymotor(tol=0.15);

// cut for right x motor shaft
translate([-(480/2-30-xmot0),20,High0+zmotor2])
rotate([90,90,0])
cylinder(r=3,h=14,$fn=F2);

F3=22;
translate([-x2+28,65,High0+zmotor2])
rotate([90,0,0]){
    // x motor mounting holes,
    translate([15.5,15.5,30])
    cylinder(r=1.6,h=30,$fn=F3);
    translate([-15.5,15.5,30])
    cylinder(r=1.6,h=30,$fn=F3);
    translate([15.5,-15.5,30])
    cylinder(r=1.6,h=30,$fn=F3);
    translate([-15.5,-15.5,30])
    cylinder(r=1.6,h=30,$fn=F3);

    // countersink for the heads
    // This one is special since it runs into the znut
    // tunnel to get screw in there
    translate([15.5,15.5,48])
    rotate([-6,7,0])
    cylinder(r=3,h=40,$fn=F3);
    // and a flat face for the head
    translate([15.5,15.5,41])
    cylinder(r=3,h=6,$fn=F3);
    
    // regular countersinks
    translate([-15.5,15.5,41])
    cylinder(r=3,h=40,$fn=F3);
    translate([15.5,-15.5,41])
    cylinder(r=3,h=40,$fn=F3);
    translate([-15.5,-15.5,41])
    cylinder(r=3,h=40,$fn=F3);
}

// main cut for belt, pulley, and idler
color("cyan")
translate([-(480/2+10),0+9.5,High0+37])
cube([90,9.5,37]);

// arch for printability
color("cyan")
translate([-(480/2+10),14.25,High0+39])
rotate([0,90,0])
scale([0.9,1,1])
cylinder(r=9.5/2,h=90,$fn=F2);

// clearance for pulley
translate([-(480/2-30-xmot0),9.5,High0+zmotor2])
rotate([-90,90,0])
cylinder(r=8,h=20,$fn=F2);

// idler attachment M3x20 screw
//translate([480/2-30-xmot0,26,High0+zmotor2-1.5])
translate([-(480/2-30-xmot0),26,High0+zmotor1+1.5])
rotate([90,90,0])
cylinder(r=1.55,h=20,$fn=F2);

// M3x30 head
//translate([480/2-30-xmot0,6,High0+zmotor2-1.5])
translate([-(480/2-30-xmot0),6,High0+zmotor1+1.5])
rotate([90,90,0])
cylinder(r=3,h=30,$fn=F2);

// idler attachment M3x30 nut
translate([-(480/2-24-xmot0),23,High0+zmotor1-2.0])
cube([12,6,9]);

// cut for the limit switch 
translate([-(x2-28+zscrew),-6.5,High0+90-34])
rotate([90,90,0])
switchcut();

// cut near limit switch to eliminate overhang
translate([-(x2+zscrew-39),-15.5,High0+20])
cube([9,10,14]);

// cut for ooze prevention arm  *****************************************
translate([-(x2+zscrew-33),-8,High0+25.5]){
  translate([0,0,-3.5])
  cylinder(r=2.3,h=3.5,$fn=22);
  cylinder(r=1.65,h=3.5+5,center=true,$fn=22);
}
translate([-(x2+zscrew-33),8,High0+25.5]){
  translate([0,0,-3.5])
  cylinder(r=2.3,h=3.5,$fn=22);
  cylinder(r=1.65,h=3.5+5,center=true,$fn=22);
}
translate([-(x2+zscrew-18),-6,High0+25.5]){
  translate([0,0,-3.5])
  cylinder(r=2.3,h=3.5,$fn=22);
  cylinder(r=1.65,h=3.5+5,center=true,$fn=22);
}

// cut for left x motor wires
translate([-(480/2-xmot0-6),30,High0+zmotor1+19])
scale([1,1,2])
rotate([90,0,-15])
cylinder(r=2.5,h=45,$fn=F2);

// cut for limit switch wires
translate([-(x2+zscrew-24),-15.5,High0+36.4])
cube([3,6,19.2]);
translate([-(x2+zscrew+9),-10.5,High0+59])
scale([1,1,2])
rotate([0,94,0])
cylinder(r=1,h=35,$fn=20);

// pry out for limit switch
translate([-(x2+zscrew-35),-7.5,High0+44])
cube([8,2,4]);

// cut for visibility
//translate([-(x2-30+zscrew+50),-40,High0+20])
//cube([100,40,100]);


} // end if all cuts

}// end diff


  // text labels
  color("red")
  translate([-x2+28,28,High0+36])
  rotate([90,0,180])
  linear_extrude(height=2,scale=1)
  text("Tom Flint", font = "Open Sans:style=Bold", size=6,halign="center",valign="center",spacing=1.1);
  color("red")
  translate([-x2+28,28,High0+28])
  rotate([90,0,180])
  linear_extrude(height=2,scale=1)
  text("Mar 2020", font = "Open Sans:style=Bold", size=6,halign="center",valign="center",spacing=1.1);


}

//=======================================================

// left limit switch 
if(0){
  color("red")
  translate([x2-28+zscrew,-5,High0+90-48])
  rotate([0,-90,90]){
    switch(ang1=0); 
    switch(ang1=12); 
  }
}

//translate([-350,0,0])
//xleft1();
if(0){
// This is a printing support enforcer for xleft1
color("pink")
translate([x2-30+zscrew+xrodscrew,0,High0+60-1])
cylinder(r=19.2/2-2,h=30,$fn=12);

color("orange")
translate([x2-30+zscrew,0,High0+76+7])
cylinder(r=10,h=6,$fn=12);

color("red")
translate([x2+zscrew-39,-13,High0+41])
cube([15,7,22]);  

color("pink")
translate([480/2-36-xmot0,23,High0+zmotor2-7])
cube([12,4.5,9]);

}

// right limit switch
if(0){
  translate([-(x2-28+zscrew),ytoz-6.5,High0+90-34])
  rotate([90,90,0]){
    switch(ang1=0);
    switch(ang1=12);
  }
}

//xright1();
if(1){
// This is a printing support for xright1
color("pink")
translate([-(x2-30+zscrew+xrodscrew),0,High0+60-1])
cylinder(r=19.2/2-2,h=30,$fn=12);

color("orange")
translate([-(x2-30+zscrew),0,High0+83])
cylinder(r=10,h=6,$fn=12);

color("red")
translate([-(x2+zscrew-24),-13,High0+36])
cube([15,7,20]);  

color("pink")
translate([-(480/2-24-xmot0),23,High0+zmotor1-2.0])
cube([12,4.5,9]);

}


if(0){
  // left x motor
  color("gray")
  translate([480/2-30-xmot0,0+76,High0+zmotor1])
  rotate([90,90,0])
  xymotor();
}
if(0){

  color("pink")
  translate([480/2-30-xmot0,0+24,High0+zmotor1])
  rotate([90,90,0])
  pulley();

  color("orange")
  translate([480/2-30-xmot0,0+24-5,High0+zmotor2-1.5])
  rotate([90,90,0])
  idler();
}

if(0){
// upper x rod
color("orange")
translate([-480/2,0+16,High0+zmotor1+34])
rotate([0,90,0])
cylinder(r=4,h=480,$fn=F2);

// lower x rod
color("orange")
translate([-480/2,0+16,High0+30])
rotate([0,90,0])
cylinder(r=4,h=480,$fn=F2);
}

if(0){
//----------- red LEFT ------------------------------------
// left z motor
color("red")
translate([x2-30+zscrew,0,15])
rotate([0,0,180])
zmotor();

// left z rod
color("red")
translate([x2-30+zscrew+xrodscrew,0,57])
cylinder(r=5,h=350,$fn=F2);

// left lm10u bearing lower
color("red")
translate([x2-30+zscrew+xrodscrew,0,High0+20])
cylinder(r=19.2/2,h=29,$fn=F2);

// left lm10u bearing upper
color("red")
translate([x2-30+zscrew+xrodscrew,0,High0+60])
cylinder(r=19.2/2,h=29,$fn=F2);

// left znut
color("red")
translate([x2-30+zscrew,ytoz,High0+90-1])
rotate([180,0,0])
znut();

}

if(0){
// left extruder
color("gray")
translate([+480/2-LeftX0,ytoz+4,High0+26])
rotate([90,0,180])
import("aqua5.stl");
// left emotor
color("gray")
translate([+480/2-LeftX0+67,ytoz-55,High0+44])
rotate([90,-90,180])
emotor();
// Add a screw head for clearance check
color("pink")
translate([+480/2-LeftX0+95,ytoz-22.5,High0+80])
rotate([90,-90,180])
cylinder(r=6.8/2,h=4);
}


if(0){
// ----- green RIGHT --------------------------------------------
// right z motor
color("green")
translate([-x2+30-zscrew,0,15])
zmotor();

// right z rod
color("green")
translate([-x2+30-zscrew-xrodscrew,0,15+42])
cylinder(r=5,h=350,$fn=F2);

// right  lm10u bearing lower
color("green")
translate([-x2+30-zscrew-xrodscrew,0,High0+16])
cylinder(r=19.2/2,h=29,$fn=F2);

// right  lm10u bearing upper
color("green")
translate([-x2+30-zscrew-xrodscrew,0,High0+60])
cylinder(r=19.2/2,h=29,$fn=F2);

// right 
color("green")
translate([-x2+30-zscrew,0,High0+90-1])
rotate([180,0,0])
znut();

//-------orange-----------------
}
if(0){
// right x motor
color("blue")
translate([-480/2+30+xmot0,0+76,High0+zmotor2])
rotate([90,90,0])
xymotor();
}

if(0){
// right x motor pulley
color("red")
translate([-480/2+30+xmot0,0+24,High0+zmotor2])
rotate([90,90,0])
pulley();

color("green")
translate([-480/2+30+xmot0,0+24-5,High0+zmotor1+1.5])
rotate([90,90,0])
idler();
}





//===============================================
